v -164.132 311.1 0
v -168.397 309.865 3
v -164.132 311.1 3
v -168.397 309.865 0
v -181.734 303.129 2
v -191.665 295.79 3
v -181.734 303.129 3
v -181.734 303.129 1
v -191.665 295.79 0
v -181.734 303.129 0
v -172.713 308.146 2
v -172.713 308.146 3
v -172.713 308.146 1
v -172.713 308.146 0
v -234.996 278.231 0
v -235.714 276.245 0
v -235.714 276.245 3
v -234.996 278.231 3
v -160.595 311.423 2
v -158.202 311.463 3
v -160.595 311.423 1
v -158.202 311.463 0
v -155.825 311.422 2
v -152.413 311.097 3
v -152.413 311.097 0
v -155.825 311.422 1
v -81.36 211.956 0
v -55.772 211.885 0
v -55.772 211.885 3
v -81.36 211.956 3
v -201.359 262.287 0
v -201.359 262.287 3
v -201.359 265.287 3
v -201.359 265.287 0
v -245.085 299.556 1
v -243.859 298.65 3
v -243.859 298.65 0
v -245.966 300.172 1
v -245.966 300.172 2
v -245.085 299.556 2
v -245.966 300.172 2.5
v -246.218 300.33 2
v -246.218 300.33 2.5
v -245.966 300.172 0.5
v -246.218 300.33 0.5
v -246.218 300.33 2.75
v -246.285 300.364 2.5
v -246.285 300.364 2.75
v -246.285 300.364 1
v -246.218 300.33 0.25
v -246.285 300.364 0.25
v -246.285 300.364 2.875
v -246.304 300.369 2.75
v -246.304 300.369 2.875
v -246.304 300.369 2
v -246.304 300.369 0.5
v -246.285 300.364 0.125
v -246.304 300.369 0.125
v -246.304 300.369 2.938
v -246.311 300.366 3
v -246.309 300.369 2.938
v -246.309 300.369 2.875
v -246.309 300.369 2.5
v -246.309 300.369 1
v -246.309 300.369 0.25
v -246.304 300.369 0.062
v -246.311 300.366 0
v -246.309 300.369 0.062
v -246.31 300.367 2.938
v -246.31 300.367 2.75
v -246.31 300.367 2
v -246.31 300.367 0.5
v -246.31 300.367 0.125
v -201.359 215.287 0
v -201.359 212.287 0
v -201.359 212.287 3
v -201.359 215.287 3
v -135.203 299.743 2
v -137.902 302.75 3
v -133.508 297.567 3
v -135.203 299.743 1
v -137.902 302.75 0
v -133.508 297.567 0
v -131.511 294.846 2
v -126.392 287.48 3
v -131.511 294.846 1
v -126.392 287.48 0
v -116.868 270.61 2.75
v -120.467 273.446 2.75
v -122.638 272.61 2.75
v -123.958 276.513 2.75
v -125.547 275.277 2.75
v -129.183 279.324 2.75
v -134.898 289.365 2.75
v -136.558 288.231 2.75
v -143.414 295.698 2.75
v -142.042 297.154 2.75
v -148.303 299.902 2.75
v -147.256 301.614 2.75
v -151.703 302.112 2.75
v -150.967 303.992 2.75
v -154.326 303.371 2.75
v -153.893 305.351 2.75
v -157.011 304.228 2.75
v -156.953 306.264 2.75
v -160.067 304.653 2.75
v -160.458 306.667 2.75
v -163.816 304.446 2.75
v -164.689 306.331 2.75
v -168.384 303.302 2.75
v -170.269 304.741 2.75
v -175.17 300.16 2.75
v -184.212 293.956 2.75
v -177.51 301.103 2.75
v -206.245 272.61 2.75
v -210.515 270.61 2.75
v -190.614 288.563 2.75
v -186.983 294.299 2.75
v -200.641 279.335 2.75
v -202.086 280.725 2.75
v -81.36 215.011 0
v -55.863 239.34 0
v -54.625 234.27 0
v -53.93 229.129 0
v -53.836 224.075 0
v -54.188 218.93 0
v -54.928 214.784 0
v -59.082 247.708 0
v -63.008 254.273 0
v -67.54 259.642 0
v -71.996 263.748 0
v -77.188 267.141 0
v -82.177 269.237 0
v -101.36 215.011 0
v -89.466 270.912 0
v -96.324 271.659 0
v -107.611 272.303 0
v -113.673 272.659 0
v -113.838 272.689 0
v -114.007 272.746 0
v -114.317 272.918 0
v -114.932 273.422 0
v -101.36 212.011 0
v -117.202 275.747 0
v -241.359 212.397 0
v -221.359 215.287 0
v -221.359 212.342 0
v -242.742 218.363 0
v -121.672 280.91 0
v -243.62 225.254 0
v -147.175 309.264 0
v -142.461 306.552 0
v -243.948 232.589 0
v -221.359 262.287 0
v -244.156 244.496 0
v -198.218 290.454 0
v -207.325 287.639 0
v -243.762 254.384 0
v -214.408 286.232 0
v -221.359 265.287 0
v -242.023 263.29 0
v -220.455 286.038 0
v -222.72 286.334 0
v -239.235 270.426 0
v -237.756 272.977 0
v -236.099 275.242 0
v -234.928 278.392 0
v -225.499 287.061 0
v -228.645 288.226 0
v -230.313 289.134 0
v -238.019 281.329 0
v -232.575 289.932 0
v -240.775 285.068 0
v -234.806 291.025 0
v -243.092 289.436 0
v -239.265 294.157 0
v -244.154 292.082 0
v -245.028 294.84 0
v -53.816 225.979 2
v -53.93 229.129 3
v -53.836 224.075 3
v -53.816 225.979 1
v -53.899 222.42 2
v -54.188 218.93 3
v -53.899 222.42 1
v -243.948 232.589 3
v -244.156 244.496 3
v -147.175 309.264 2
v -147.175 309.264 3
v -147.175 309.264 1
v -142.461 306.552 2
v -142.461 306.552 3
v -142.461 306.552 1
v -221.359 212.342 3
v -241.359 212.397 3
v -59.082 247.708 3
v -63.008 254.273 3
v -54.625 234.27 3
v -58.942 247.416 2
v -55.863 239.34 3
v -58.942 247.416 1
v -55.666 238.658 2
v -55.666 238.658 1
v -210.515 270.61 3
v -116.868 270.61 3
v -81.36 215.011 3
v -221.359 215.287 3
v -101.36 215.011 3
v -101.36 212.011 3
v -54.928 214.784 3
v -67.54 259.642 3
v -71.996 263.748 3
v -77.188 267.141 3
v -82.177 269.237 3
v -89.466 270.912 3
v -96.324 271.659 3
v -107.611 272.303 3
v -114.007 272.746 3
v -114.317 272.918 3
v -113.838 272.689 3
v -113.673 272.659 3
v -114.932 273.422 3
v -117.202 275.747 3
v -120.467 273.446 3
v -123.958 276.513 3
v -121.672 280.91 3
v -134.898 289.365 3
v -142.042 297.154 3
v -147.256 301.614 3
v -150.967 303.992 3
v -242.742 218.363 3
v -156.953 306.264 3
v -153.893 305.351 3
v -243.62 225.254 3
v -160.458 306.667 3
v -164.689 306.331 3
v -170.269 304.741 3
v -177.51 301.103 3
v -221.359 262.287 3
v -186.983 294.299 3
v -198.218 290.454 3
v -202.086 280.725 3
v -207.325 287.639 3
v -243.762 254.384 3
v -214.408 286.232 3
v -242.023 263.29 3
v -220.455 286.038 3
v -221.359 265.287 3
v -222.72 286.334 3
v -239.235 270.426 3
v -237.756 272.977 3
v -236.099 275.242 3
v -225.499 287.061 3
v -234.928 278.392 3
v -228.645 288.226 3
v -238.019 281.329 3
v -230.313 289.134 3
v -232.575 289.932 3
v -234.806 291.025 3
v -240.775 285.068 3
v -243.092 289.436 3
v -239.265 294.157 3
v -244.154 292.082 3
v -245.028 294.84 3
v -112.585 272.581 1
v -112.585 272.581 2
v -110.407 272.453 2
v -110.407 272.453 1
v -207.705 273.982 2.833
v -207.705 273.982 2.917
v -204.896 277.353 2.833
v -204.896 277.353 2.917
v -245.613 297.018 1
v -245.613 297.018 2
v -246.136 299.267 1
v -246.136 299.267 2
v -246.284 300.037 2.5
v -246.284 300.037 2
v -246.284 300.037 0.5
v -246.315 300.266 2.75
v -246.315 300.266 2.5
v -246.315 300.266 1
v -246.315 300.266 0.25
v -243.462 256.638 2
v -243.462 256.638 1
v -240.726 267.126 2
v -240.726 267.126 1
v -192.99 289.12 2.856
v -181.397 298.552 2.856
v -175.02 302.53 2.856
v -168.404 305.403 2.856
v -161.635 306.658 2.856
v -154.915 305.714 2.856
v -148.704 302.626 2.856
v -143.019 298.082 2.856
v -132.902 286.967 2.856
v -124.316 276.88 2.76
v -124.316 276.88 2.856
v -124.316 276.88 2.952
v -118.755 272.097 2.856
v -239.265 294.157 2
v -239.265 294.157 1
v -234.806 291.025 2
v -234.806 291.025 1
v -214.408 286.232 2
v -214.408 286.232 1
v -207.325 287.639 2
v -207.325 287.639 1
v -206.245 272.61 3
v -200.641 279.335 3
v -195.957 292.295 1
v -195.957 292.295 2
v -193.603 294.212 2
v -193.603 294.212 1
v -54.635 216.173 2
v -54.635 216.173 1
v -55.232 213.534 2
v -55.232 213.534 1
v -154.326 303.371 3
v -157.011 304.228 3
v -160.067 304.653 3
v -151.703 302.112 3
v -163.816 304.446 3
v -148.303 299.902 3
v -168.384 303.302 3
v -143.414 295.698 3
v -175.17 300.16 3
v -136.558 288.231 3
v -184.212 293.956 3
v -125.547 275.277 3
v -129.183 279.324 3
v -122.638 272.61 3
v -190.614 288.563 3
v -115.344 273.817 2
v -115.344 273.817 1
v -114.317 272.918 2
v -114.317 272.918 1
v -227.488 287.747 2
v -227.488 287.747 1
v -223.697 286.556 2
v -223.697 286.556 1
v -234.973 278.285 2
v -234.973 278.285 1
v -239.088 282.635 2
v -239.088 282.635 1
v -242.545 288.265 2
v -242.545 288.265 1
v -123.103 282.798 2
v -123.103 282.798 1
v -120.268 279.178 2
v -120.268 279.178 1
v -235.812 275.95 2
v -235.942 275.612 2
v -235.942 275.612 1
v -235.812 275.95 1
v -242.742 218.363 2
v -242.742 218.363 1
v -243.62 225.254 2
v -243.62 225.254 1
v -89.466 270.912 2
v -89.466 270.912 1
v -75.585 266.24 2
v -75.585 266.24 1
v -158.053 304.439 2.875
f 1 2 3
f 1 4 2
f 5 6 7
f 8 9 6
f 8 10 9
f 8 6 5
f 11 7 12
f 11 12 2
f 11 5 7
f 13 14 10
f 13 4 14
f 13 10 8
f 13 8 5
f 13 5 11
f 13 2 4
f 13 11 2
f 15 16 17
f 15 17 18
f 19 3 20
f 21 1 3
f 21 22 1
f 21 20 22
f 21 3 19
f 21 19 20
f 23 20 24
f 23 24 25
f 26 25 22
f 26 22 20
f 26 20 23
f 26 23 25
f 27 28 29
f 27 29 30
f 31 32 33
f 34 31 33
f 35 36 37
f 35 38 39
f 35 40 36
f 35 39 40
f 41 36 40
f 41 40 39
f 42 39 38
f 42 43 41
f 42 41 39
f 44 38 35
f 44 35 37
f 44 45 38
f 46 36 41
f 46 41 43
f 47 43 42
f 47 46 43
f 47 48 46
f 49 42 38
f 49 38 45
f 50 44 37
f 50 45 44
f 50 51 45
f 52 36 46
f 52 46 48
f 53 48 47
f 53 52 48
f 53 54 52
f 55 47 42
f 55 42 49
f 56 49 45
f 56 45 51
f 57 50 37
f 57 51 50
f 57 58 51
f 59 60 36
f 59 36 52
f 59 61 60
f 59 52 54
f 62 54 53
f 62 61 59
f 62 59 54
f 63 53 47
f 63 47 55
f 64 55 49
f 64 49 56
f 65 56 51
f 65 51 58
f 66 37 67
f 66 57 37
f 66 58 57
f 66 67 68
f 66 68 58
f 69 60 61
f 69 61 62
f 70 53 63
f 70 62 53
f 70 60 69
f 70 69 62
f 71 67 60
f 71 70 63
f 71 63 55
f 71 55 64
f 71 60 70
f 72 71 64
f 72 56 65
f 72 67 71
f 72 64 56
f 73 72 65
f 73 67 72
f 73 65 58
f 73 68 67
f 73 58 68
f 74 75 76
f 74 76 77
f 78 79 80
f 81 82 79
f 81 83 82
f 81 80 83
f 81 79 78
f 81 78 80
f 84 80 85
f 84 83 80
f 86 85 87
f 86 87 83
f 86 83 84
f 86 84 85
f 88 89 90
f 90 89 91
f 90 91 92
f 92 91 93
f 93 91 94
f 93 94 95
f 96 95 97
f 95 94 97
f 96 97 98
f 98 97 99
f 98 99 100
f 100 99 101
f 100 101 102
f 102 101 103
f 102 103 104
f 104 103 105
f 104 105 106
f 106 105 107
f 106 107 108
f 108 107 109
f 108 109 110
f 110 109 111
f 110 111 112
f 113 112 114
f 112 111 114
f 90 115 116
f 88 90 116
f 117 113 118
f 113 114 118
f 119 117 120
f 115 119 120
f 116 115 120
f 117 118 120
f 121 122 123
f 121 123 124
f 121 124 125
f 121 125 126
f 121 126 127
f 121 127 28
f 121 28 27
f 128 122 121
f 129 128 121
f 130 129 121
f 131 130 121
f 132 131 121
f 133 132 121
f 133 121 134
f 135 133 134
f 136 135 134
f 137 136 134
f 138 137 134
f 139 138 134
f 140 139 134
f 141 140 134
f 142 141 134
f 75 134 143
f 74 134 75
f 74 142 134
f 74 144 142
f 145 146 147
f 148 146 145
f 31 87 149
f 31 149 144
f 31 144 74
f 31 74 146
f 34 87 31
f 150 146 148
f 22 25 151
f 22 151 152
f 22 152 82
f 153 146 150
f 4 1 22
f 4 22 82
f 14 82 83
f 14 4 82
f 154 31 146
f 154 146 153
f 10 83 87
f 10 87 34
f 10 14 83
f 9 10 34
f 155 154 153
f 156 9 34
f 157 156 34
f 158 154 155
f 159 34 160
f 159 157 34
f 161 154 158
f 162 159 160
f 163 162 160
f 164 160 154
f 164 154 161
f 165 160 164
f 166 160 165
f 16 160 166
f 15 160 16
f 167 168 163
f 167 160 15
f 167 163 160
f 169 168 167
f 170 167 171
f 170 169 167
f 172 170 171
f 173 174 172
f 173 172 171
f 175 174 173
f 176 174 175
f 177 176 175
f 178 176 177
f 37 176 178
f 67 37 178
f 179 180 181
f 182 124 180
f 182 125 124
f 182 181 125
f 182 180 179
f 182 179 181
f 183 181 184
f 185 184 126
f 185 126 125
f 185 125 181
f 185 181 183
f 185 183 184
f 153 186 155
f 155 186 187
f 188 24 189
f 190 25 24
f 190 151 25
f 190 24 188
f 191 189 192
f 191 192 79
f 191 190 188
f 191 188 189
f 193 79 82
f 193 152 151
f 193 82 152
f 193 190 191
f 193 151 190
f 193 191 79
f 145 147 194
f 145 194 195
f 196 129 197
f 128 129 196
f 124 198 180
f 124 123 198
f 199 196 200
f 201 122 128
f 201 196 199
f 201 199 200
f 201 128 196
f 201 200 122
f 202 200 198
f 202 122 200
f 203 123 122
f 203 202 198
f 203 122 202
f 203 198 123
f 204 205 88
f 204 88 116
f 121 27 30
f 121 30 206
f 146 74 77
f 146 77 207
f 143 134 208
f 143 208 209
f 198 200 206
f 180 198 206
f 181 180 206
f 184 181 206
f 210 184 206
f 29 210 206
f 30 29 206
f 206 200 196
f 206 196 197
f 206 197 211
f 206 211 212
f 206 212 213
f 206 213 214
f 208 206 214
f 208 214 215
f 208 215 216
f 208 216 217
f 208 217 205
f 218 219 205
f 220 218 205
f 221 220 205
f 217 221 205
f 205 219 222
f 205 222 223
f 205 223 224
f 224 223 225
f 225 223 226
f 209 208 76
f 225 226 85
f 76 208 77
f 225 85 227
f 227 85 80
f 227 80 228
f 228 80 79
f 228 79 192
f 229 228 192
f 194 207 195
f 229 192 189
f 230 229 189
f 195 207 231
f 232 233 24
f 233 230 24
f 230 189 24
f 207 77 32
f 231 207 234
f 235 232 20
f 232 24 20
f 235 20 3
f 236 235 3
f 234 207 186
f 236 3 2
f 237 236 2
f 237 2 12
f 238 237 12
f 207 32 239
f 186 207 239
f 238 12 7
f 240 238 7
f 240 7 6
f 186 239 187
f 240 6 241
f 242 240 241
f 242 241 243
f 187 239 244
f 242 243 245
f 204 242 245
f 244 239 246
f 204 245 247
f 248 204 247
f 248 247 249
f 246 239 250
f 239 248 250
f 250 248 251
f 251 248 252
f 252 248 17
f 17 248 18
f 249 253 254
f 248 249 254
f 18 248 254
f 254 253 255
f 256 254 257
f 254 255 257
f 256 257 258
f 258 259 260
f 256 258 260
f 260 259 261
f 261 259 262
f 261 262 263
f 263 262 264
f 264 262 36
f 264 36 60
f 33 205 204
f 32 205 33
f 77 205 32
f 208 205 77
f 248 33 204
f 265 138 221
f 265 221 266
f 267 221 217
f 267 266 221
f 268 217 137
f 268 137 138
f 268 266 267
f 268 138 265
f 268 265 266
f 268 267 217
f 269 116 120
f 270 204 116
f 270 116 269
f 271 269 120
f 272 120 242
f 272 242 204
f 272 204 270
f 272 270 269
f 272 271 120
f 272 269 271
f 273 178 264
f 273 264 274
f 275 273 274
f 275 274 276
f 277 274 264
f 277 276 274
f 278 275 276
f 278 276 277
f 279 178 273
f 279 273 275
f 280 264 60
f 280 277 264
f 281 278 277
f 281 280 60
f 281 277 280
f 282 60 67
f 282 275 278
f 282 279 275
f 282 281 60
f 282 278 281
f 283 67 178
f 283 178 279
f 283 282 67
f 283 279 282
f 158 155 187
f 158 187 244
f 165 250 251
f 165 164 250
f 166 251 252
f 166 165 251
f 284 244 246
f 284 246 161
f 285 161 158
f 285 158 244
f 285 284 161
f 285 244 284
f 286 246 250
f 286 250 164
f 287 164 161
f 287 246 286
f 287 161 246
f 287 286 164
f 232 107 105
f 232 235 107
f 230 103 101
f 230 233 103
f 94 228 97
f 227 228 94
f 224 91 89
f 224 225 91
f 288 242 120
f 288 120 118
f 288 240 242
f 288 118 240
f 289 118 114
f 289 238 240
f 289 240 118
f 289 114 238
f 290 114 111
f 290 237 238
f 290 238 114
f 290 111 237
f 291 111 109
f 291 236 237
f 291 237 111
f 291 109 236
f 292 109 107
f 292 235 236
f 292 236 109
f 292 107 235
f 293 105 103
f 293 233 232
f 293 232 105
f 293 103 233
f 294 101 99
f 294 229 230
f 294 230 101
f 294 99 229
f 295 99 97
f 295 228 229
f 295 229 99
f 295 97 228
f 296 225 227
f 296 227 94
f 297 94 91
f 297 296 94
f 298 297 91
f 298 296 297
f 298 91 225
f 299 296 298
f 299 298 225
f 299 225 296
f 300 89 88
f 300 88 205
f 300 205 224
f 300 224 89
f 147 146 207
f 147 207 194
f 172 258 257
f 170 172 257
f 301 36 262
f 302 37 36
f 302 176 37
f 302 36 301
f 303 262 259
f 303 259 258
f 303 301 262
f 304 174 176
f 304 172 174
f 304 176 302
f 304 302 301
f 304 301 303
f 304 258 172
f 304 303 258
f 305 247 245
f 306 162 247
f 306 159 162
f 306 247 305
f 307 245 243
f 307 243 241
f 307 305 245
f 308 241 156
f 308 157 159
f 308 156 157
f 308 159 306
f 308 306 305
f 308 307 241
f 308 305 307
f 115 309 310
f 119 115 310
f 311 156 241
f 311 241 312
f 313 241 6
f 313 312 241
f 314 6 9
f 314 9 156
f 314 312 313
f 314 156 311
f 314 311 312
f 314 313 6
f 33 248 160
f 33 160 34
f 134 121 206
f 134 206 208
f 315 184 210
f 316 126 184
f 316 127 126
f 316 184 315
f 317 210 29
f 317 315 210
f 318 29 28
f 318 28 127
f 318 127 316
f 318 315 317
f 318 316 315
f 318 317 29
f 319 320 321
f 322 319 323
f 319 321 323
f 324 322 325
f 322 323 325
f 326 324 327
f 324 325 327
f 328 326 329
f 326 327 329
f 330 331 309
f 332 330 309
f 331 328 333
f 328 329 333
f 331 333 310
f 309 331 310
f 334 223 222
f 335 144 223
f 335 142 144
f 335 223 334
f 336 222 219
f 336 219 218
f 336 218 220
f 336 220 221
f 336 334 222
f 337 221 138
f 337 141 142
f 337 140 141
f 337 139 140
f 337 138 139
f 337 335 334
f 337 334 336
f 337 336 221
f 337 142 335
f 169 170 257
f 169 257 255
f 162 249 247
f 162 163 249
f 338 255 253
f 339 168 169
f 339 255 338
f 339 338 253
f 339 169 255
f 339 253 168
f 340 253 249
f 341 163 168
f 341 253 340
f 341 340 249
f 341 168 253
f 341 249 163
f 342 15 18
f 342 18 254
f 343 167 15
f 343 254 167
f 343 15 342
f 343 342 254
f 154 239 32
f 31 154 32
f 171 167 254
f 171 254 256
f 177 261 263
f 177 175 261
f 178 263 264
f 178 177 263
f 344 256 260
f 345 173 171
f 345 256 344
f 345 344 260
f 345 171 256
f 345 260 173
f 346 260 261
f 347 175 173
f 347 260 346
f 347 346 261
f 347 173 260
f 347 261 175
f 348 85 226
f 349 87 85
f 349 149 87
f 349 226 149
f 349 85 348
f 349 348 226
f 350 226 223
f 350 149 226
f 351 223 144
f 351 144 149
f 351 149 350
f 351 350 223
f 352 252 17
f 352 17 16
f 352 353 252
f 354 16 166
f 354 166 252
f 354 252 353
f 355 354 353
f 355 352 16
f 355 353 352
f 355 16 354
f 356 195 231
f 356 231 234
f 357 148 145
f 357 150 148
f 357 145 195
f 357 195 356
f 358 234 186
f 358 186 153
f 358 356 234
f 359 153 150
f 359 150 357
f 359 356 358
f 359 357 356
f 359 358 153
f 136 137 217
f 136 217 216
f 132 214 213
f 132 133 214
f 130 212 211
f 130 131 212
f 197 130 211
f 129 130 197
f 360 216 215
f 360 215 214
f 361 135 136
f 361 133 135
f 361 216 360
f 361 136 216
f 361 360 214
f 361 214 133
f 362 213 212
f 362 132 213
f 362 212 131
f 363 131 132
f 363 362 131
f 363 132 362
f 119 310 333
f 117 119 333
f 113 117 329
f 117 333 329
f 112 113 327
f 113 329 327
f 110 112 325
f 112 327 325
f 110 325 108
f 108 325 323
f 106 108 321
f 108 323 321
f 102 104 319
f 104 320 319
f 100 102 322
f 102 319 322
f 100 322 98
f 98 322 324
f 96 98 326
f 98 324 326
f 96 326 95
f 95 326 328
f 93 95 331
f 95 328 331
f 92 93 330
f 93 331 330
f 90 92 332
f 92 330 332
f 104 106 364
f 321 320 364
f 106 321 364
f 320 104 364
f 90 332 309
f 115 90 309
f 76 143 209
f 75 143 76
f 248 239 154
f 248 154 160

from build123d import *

# Parameters (mm, degrees)
BOSS_EXTRUDE1_DEPTH = 3
SKETCH2_W           = 20
SKETCH2_H           = 3
CUT_EXTRUDE1_DEPTH  = 10
CUT_EXTRUDE2_DEPTH  = 0.25
FILLET1_R           = 490
FILLET3_R           = 20


with BuildPart() as part:
    # Sketch1 → Boss-Extrude1 (new body)
    with BuildSketch(Plane.XY):
        with BuildLine():
            Line((-55.771613477, 211.884964235), (-81.359563224, 211.955586631))
            Line((-81.359563224, 211.955586631), (-81.359563224, 215.010786361))
            Line((-81.359563224, 215.010786361), (-101.359563224, 215.010786361))
            Line((-101.359563224, 215.010786361), (-101.359563224, 212.010786361))
            Line((-101.359563224, 212.010786361), (-201.35903, 212.28678354))
            Line((-201.35903, 212.28678354), (-201.35903, 215.28678354))
            Line((-201.35903, 215.28678354), (-221.35903, 215.28678354))
            Line((-221.35903, 215.28678354), (-221.35903, 212.34198327))
            Line((-221.35903, 212.34198327), (-241.35903, 212.397183))
            add(Edge.make_bspline(
                [(-241.35903, 212.397183), (-243.433200806, 219.233539852), (-244.37501358, 229.532087014), (-243.767840249, 238.737074774)],
                knots=[0, 0, 0, 0, 1, 1, 1, 1], degree=3))
            add(Edge.make_bspline(
                [(-243.767840249, 238.737074774), (-245.3417367, 253.755030644), (-242.442141826, 267.557324246), (-236.098911434, 275.241845869)],
                knots=[0, 0, 0, 0, 1, 1, 1, 1], degree=3))
            add(Edge.make_bspline(
                [(-236.098911434, 275.241845869), (-235.734186419, 276.060814752), (-235.537632123, 276.743555368), (-235.662116873, 276.759057769)],
                knots=[0, 0, 0, 0, 1, 1, 1, 1], degree=3))
            add(Edge.make_bspline(
                [(-235.662116873, 276.759057769), (-235.591127974, 276.862477635), (-235.260826653, 277.597138511), (-234.928115217, 278.391644727)],
                knots=[0, 0, 0, 0, 1, 1, 1, 1], degree=3))
            add(Edge.make_bspline(
                [(-234.928115217, 278.391644727), (-239.348910331, 281.793983673), (-243.122699165, 287.939625439), (-245.028490728, 294.840167335)],
                knots=[0, 0, 0, 0, 1, 1, 1, 1], degree=3))
            add(Edge.make_bspline(
                [(-245.028490728, 294.840167335), (-245.550247129, 296.573870804), (-246.403646496, 300.250938453), (-246.310899804, 300.365745035)],
                knots=[0, 0, 0, 0, 1, 1, 1, 1], degree=3))
            add(Edge.make_bspline(
                [(-246.310899804, 300.365745035), (-246.297955678, 300.428351845), (-245.194510621, 299.656108866), (-243.858829054, 298.649604138)],
                knots=[0, 0, 0, 0, 1, 1, 1, 1], degree=3))
            add(Edge.make_bspline(
                [(-243.858829054, 298.649604138), (-239.139760648, 293.437037617), (-234.88048493, 290.445021181), (-230.313280496, 289.134244505)],
                knots=[0, 0, 0, 0, 1, 1, 1, 1], degree=3))
            add(Edge.make_bspline(
                [(-230.313280496, 289.134244505), (-228.476266882, 287.808285747), (-222.916561014, 286.061770109), (-220.455333428, 286.037508782)],
                knots=[0, 0, 0, 0, 1, 1, 1, 1], degree=3))
            add(Edge.make_bspline(
                [(-220.455333428, 286.037508782), (-214.594566251, 285.692008955), (-208.668289514, 286.869079887), (-198.217921477, 290.454290235)],
                knots=[0, 0, 0, 0, 1, 1, 1, 1], degree=3))
            add(Edge.make_bspline(
                [(-198.217921477, 290.454290235), (-196.173393477, 292.118481235), (-193.224738477, 294.519464235), (-191.665350477, 295.789808235)],
                knots=[0, 0, 0, 0, 1, 1, 1, 1], degree=3))
            add(Edge.make_bspline(
                [(-191.665350477, 295.789808235), (-181.123444477, 304.377742235), (-172.648779477, 309.090312235), (-164.131959477, 311.100493235)],
                knots=[0, 0, 0, 0, 1, 1, 1, 1], degree=3))
            add(Edge.make_bspline(
                [(-164.131959477, 311.100493235), (-162.075544477, 311.585852235), (-154.282194477, 311.583190235), (-152.412943477, 311.096855235)],
                knots=[0, 0, 0, 0, 1, 1, 1, 1], degree=3))
            add(Edge.make_bspline(
                [(-152.412943477, 311.096855235), (-146.791988477, 309.633287235), (-142.504601477, 307.167024235), (-137.901986477, 302.749608235)],
                knots=[0, 0, 0, 0, 1, 1, 1, 1], degree=3))
            add(Edge.make_bspline(
                [(-137.901986477, 302.749608235), (-135.553087477, 300.495235235), (-132.370938477, 296.273870235), (-126.391682477, 287.480322235)],
                knots=[0, 0, 0, 0, 1, 1, 1, 1], degree=3))
            add(Edge.make_bspline(
                [(-126.391682477, 287.480322235), (-122.648888477, 281.975879235), (-120.611935477, 279.375243235), (-117.201573477, 275.747032235)],
                knots=[0, 0, 0, 0, 1, 1, 1, 1], degree=3))
            add(Edge.make_bspline(
                [(-117.201573477, 275.747032235), (-114.779872477, 273.170633235), (-114.274522477, 272.728335235), (-113.673270477, 272.659053235)],
                knots=[0, 0, 0, 0, 1, 1, 1, 1], degree=3))
            add(Edge.make_bspline(
                [(-113.673270477, 272.659053235), (-113.287311477, 272.614543235), (-110.559377477, 272.454465235), (-107.611210477, 272.303276235)],
                knots=[0, 0, 0, 0, 1, 1, 1, 1], degree=3))
            add(Edge.make_bspline(
                [(-107.611210477, 272.303276235), (-86.346815477, 271.212768235), (-75.919051477, 271.227091235), (-63.008175477, 254.273392235)],
                knots=[0, 0, 0, 0, 1, 1, 1, 1], degree=3))
            add(Edge.make_bspline(
                [(-63.008175477, 254.273392235), (-58.796714477, 248.743189235), (-54.645708477, 238.666261235), (-53.930170477, 229.128885235)],
                knots=[0, 0, 0, 0, 1, 1, 1, 1], degree=3))
            add(Edge.make_bspline(
                [(-53.930170477, 229.128885235), (-53.721105477, 226.342367235), (-53.792620477, 222.226585235), (-54.187873477, 218.929577235)],
                knots=[0, 0, 0, 0, 1, 1, 1, 1], degree=3))
            add(Edge.make_bspline(
                [(-54.187873477, 218.929577235), (-54.490646477, 216.403965235), (-55.330161477, 212.748448235), (-55.771613477, 211.884964235)],
                knots=[0, 0, 0, 0, 1, 1, 1, 1], degree=3))
        make_face()
    extrude(amount=BOSS_EXTRUDE1_DEPTH)

    # Sketch2 → Cut-Extrude1 (cut)
    with BuildSketch(Plane.XY.offset(3)):
        with Locations((-211.35903, 263.78678354)):
            Rectangle(SKETCH2_W, SKETCH2_H)
    extrude(amount=-CUT_EXTRUDE1_DEPTH, mode=Mode.SUBTRACT)

    # Sketch3 → Cut-Extrude2 (cut)
    with BuildSketch(Plane.XY.offset(3)):
        with BuildLine():
            Line((-116.868078285, 270.610137644), (-210.515138227, 270.610137644))
            add(Edge.make_bspline(
                [(-210.515138227, 270.610137644), (-207.70545666, 273.981755523), (-204.895775094, 277.353373403), (-202.086093528, 280.724991282)],
                knots=[-0.016370448, -0.016370448, -0.016370448, -0.016370448, 1.487830463, 1.487830463, 1.487830463, 1.487830463], degree=3))
            add(Edge.make_bspline(
                [(-202.086093528, 280.724991282), (-201.766234136, 281.012976719), (-201.144139601, 281.577239578), (-199.786496921, 282.829895906), (-197.964221503, 284.533273518), (-195.576523782, 286.761310892), (-192.162134227, 289.891662395), (-187.50773268, 293.965058043), (-181.45316595, 298.659090822), (-175.059283421, 302.712451052), (-168.430508839, 305.669716279), (-162.772920874, 306.800498019), (-158.227383425, 306.597875257), (-153.773816434, 305.539082012), (-148.617979666, 302.864179961), (-142.948146748, 298.224394235), (-137.704633986, 292.728150104), (-132.840288674, 286.925849289), (-129.093423169, 282.29792081), (-126.29098522, 279.00745692), (-124.295352757, 276.820107186), (-122.733571759, 275.296680217), (-121.780259282, 274.481794778), (-121.354541261, 274.144686547), (-121.032576368, 273.89129731), (-120.174428775, 273.21494435), (-118.753402125, 272.095580379), (-117.497087951, 271.105712044), (-116.868078285, 270.610137644)],
                knots=[-0.00190331, -0.00190331, -0.00190331, -0.00190331, 0.015021831, 0.031946973, 0.065797257, 0.09964754, 0.133497824, 0.201198391, 0.268898959, 0.336599526, 0.404300093, 0.47200066, 0.505850944, 0.539701228, 0.607401795, 0.675102362, 0.742802929, 0.810503496, 0.878204064, 0.912054347, 0.945904631, 0.979754915, 0.996680056, 1.000911342, 1.005142627, 1.013605198, 1.047455482, 1.081305765, 1.081305765, 1.081305765, 1.081305765], degree=3))
        make_face()
        with BuildLine():
            Line((-122.638306737, 272.610137644), (-206.245055001, 272.610137644))
            Line((-206.245055001, 272.610137644), (-200.641385547, 279.33454099))
            add(Edge.make_bspline(
                [(-200.641385547, 279.33454099), (-191.110400539, 287.915764347), (-155.998393866, 325.235868613), (-131.724200162, 279.768590736), (-122.638306737, 272.610137644)],
                knots=[0, 0, 0, 0, 0.511040789, 1, 1, 1, 1], degree=3))
        make_face(mode=Mode.SUBTRACT)
    extrude(amount=-CUT_EXTRUDE2_DEPTH, mode=Mode.SUBTRACT)

    # Fillet1
    fillet1_edges = [part.edges().sort_by_distance(p)[0] for p in [
        (-243.767840249, 238.737074774, 1.5),
    ]]
    fillet(fillet1_edges, radius=FILLET1_R)

    # Fillet3
    fillet3_edges = [part.edges().sort_by_distance(p)[0] for p in [
        (-235.662116873, 276.759057769, 1.5),
    ]]
    fillet(fillet3_edges, radius=FILLET3_R)


solid = part.part
